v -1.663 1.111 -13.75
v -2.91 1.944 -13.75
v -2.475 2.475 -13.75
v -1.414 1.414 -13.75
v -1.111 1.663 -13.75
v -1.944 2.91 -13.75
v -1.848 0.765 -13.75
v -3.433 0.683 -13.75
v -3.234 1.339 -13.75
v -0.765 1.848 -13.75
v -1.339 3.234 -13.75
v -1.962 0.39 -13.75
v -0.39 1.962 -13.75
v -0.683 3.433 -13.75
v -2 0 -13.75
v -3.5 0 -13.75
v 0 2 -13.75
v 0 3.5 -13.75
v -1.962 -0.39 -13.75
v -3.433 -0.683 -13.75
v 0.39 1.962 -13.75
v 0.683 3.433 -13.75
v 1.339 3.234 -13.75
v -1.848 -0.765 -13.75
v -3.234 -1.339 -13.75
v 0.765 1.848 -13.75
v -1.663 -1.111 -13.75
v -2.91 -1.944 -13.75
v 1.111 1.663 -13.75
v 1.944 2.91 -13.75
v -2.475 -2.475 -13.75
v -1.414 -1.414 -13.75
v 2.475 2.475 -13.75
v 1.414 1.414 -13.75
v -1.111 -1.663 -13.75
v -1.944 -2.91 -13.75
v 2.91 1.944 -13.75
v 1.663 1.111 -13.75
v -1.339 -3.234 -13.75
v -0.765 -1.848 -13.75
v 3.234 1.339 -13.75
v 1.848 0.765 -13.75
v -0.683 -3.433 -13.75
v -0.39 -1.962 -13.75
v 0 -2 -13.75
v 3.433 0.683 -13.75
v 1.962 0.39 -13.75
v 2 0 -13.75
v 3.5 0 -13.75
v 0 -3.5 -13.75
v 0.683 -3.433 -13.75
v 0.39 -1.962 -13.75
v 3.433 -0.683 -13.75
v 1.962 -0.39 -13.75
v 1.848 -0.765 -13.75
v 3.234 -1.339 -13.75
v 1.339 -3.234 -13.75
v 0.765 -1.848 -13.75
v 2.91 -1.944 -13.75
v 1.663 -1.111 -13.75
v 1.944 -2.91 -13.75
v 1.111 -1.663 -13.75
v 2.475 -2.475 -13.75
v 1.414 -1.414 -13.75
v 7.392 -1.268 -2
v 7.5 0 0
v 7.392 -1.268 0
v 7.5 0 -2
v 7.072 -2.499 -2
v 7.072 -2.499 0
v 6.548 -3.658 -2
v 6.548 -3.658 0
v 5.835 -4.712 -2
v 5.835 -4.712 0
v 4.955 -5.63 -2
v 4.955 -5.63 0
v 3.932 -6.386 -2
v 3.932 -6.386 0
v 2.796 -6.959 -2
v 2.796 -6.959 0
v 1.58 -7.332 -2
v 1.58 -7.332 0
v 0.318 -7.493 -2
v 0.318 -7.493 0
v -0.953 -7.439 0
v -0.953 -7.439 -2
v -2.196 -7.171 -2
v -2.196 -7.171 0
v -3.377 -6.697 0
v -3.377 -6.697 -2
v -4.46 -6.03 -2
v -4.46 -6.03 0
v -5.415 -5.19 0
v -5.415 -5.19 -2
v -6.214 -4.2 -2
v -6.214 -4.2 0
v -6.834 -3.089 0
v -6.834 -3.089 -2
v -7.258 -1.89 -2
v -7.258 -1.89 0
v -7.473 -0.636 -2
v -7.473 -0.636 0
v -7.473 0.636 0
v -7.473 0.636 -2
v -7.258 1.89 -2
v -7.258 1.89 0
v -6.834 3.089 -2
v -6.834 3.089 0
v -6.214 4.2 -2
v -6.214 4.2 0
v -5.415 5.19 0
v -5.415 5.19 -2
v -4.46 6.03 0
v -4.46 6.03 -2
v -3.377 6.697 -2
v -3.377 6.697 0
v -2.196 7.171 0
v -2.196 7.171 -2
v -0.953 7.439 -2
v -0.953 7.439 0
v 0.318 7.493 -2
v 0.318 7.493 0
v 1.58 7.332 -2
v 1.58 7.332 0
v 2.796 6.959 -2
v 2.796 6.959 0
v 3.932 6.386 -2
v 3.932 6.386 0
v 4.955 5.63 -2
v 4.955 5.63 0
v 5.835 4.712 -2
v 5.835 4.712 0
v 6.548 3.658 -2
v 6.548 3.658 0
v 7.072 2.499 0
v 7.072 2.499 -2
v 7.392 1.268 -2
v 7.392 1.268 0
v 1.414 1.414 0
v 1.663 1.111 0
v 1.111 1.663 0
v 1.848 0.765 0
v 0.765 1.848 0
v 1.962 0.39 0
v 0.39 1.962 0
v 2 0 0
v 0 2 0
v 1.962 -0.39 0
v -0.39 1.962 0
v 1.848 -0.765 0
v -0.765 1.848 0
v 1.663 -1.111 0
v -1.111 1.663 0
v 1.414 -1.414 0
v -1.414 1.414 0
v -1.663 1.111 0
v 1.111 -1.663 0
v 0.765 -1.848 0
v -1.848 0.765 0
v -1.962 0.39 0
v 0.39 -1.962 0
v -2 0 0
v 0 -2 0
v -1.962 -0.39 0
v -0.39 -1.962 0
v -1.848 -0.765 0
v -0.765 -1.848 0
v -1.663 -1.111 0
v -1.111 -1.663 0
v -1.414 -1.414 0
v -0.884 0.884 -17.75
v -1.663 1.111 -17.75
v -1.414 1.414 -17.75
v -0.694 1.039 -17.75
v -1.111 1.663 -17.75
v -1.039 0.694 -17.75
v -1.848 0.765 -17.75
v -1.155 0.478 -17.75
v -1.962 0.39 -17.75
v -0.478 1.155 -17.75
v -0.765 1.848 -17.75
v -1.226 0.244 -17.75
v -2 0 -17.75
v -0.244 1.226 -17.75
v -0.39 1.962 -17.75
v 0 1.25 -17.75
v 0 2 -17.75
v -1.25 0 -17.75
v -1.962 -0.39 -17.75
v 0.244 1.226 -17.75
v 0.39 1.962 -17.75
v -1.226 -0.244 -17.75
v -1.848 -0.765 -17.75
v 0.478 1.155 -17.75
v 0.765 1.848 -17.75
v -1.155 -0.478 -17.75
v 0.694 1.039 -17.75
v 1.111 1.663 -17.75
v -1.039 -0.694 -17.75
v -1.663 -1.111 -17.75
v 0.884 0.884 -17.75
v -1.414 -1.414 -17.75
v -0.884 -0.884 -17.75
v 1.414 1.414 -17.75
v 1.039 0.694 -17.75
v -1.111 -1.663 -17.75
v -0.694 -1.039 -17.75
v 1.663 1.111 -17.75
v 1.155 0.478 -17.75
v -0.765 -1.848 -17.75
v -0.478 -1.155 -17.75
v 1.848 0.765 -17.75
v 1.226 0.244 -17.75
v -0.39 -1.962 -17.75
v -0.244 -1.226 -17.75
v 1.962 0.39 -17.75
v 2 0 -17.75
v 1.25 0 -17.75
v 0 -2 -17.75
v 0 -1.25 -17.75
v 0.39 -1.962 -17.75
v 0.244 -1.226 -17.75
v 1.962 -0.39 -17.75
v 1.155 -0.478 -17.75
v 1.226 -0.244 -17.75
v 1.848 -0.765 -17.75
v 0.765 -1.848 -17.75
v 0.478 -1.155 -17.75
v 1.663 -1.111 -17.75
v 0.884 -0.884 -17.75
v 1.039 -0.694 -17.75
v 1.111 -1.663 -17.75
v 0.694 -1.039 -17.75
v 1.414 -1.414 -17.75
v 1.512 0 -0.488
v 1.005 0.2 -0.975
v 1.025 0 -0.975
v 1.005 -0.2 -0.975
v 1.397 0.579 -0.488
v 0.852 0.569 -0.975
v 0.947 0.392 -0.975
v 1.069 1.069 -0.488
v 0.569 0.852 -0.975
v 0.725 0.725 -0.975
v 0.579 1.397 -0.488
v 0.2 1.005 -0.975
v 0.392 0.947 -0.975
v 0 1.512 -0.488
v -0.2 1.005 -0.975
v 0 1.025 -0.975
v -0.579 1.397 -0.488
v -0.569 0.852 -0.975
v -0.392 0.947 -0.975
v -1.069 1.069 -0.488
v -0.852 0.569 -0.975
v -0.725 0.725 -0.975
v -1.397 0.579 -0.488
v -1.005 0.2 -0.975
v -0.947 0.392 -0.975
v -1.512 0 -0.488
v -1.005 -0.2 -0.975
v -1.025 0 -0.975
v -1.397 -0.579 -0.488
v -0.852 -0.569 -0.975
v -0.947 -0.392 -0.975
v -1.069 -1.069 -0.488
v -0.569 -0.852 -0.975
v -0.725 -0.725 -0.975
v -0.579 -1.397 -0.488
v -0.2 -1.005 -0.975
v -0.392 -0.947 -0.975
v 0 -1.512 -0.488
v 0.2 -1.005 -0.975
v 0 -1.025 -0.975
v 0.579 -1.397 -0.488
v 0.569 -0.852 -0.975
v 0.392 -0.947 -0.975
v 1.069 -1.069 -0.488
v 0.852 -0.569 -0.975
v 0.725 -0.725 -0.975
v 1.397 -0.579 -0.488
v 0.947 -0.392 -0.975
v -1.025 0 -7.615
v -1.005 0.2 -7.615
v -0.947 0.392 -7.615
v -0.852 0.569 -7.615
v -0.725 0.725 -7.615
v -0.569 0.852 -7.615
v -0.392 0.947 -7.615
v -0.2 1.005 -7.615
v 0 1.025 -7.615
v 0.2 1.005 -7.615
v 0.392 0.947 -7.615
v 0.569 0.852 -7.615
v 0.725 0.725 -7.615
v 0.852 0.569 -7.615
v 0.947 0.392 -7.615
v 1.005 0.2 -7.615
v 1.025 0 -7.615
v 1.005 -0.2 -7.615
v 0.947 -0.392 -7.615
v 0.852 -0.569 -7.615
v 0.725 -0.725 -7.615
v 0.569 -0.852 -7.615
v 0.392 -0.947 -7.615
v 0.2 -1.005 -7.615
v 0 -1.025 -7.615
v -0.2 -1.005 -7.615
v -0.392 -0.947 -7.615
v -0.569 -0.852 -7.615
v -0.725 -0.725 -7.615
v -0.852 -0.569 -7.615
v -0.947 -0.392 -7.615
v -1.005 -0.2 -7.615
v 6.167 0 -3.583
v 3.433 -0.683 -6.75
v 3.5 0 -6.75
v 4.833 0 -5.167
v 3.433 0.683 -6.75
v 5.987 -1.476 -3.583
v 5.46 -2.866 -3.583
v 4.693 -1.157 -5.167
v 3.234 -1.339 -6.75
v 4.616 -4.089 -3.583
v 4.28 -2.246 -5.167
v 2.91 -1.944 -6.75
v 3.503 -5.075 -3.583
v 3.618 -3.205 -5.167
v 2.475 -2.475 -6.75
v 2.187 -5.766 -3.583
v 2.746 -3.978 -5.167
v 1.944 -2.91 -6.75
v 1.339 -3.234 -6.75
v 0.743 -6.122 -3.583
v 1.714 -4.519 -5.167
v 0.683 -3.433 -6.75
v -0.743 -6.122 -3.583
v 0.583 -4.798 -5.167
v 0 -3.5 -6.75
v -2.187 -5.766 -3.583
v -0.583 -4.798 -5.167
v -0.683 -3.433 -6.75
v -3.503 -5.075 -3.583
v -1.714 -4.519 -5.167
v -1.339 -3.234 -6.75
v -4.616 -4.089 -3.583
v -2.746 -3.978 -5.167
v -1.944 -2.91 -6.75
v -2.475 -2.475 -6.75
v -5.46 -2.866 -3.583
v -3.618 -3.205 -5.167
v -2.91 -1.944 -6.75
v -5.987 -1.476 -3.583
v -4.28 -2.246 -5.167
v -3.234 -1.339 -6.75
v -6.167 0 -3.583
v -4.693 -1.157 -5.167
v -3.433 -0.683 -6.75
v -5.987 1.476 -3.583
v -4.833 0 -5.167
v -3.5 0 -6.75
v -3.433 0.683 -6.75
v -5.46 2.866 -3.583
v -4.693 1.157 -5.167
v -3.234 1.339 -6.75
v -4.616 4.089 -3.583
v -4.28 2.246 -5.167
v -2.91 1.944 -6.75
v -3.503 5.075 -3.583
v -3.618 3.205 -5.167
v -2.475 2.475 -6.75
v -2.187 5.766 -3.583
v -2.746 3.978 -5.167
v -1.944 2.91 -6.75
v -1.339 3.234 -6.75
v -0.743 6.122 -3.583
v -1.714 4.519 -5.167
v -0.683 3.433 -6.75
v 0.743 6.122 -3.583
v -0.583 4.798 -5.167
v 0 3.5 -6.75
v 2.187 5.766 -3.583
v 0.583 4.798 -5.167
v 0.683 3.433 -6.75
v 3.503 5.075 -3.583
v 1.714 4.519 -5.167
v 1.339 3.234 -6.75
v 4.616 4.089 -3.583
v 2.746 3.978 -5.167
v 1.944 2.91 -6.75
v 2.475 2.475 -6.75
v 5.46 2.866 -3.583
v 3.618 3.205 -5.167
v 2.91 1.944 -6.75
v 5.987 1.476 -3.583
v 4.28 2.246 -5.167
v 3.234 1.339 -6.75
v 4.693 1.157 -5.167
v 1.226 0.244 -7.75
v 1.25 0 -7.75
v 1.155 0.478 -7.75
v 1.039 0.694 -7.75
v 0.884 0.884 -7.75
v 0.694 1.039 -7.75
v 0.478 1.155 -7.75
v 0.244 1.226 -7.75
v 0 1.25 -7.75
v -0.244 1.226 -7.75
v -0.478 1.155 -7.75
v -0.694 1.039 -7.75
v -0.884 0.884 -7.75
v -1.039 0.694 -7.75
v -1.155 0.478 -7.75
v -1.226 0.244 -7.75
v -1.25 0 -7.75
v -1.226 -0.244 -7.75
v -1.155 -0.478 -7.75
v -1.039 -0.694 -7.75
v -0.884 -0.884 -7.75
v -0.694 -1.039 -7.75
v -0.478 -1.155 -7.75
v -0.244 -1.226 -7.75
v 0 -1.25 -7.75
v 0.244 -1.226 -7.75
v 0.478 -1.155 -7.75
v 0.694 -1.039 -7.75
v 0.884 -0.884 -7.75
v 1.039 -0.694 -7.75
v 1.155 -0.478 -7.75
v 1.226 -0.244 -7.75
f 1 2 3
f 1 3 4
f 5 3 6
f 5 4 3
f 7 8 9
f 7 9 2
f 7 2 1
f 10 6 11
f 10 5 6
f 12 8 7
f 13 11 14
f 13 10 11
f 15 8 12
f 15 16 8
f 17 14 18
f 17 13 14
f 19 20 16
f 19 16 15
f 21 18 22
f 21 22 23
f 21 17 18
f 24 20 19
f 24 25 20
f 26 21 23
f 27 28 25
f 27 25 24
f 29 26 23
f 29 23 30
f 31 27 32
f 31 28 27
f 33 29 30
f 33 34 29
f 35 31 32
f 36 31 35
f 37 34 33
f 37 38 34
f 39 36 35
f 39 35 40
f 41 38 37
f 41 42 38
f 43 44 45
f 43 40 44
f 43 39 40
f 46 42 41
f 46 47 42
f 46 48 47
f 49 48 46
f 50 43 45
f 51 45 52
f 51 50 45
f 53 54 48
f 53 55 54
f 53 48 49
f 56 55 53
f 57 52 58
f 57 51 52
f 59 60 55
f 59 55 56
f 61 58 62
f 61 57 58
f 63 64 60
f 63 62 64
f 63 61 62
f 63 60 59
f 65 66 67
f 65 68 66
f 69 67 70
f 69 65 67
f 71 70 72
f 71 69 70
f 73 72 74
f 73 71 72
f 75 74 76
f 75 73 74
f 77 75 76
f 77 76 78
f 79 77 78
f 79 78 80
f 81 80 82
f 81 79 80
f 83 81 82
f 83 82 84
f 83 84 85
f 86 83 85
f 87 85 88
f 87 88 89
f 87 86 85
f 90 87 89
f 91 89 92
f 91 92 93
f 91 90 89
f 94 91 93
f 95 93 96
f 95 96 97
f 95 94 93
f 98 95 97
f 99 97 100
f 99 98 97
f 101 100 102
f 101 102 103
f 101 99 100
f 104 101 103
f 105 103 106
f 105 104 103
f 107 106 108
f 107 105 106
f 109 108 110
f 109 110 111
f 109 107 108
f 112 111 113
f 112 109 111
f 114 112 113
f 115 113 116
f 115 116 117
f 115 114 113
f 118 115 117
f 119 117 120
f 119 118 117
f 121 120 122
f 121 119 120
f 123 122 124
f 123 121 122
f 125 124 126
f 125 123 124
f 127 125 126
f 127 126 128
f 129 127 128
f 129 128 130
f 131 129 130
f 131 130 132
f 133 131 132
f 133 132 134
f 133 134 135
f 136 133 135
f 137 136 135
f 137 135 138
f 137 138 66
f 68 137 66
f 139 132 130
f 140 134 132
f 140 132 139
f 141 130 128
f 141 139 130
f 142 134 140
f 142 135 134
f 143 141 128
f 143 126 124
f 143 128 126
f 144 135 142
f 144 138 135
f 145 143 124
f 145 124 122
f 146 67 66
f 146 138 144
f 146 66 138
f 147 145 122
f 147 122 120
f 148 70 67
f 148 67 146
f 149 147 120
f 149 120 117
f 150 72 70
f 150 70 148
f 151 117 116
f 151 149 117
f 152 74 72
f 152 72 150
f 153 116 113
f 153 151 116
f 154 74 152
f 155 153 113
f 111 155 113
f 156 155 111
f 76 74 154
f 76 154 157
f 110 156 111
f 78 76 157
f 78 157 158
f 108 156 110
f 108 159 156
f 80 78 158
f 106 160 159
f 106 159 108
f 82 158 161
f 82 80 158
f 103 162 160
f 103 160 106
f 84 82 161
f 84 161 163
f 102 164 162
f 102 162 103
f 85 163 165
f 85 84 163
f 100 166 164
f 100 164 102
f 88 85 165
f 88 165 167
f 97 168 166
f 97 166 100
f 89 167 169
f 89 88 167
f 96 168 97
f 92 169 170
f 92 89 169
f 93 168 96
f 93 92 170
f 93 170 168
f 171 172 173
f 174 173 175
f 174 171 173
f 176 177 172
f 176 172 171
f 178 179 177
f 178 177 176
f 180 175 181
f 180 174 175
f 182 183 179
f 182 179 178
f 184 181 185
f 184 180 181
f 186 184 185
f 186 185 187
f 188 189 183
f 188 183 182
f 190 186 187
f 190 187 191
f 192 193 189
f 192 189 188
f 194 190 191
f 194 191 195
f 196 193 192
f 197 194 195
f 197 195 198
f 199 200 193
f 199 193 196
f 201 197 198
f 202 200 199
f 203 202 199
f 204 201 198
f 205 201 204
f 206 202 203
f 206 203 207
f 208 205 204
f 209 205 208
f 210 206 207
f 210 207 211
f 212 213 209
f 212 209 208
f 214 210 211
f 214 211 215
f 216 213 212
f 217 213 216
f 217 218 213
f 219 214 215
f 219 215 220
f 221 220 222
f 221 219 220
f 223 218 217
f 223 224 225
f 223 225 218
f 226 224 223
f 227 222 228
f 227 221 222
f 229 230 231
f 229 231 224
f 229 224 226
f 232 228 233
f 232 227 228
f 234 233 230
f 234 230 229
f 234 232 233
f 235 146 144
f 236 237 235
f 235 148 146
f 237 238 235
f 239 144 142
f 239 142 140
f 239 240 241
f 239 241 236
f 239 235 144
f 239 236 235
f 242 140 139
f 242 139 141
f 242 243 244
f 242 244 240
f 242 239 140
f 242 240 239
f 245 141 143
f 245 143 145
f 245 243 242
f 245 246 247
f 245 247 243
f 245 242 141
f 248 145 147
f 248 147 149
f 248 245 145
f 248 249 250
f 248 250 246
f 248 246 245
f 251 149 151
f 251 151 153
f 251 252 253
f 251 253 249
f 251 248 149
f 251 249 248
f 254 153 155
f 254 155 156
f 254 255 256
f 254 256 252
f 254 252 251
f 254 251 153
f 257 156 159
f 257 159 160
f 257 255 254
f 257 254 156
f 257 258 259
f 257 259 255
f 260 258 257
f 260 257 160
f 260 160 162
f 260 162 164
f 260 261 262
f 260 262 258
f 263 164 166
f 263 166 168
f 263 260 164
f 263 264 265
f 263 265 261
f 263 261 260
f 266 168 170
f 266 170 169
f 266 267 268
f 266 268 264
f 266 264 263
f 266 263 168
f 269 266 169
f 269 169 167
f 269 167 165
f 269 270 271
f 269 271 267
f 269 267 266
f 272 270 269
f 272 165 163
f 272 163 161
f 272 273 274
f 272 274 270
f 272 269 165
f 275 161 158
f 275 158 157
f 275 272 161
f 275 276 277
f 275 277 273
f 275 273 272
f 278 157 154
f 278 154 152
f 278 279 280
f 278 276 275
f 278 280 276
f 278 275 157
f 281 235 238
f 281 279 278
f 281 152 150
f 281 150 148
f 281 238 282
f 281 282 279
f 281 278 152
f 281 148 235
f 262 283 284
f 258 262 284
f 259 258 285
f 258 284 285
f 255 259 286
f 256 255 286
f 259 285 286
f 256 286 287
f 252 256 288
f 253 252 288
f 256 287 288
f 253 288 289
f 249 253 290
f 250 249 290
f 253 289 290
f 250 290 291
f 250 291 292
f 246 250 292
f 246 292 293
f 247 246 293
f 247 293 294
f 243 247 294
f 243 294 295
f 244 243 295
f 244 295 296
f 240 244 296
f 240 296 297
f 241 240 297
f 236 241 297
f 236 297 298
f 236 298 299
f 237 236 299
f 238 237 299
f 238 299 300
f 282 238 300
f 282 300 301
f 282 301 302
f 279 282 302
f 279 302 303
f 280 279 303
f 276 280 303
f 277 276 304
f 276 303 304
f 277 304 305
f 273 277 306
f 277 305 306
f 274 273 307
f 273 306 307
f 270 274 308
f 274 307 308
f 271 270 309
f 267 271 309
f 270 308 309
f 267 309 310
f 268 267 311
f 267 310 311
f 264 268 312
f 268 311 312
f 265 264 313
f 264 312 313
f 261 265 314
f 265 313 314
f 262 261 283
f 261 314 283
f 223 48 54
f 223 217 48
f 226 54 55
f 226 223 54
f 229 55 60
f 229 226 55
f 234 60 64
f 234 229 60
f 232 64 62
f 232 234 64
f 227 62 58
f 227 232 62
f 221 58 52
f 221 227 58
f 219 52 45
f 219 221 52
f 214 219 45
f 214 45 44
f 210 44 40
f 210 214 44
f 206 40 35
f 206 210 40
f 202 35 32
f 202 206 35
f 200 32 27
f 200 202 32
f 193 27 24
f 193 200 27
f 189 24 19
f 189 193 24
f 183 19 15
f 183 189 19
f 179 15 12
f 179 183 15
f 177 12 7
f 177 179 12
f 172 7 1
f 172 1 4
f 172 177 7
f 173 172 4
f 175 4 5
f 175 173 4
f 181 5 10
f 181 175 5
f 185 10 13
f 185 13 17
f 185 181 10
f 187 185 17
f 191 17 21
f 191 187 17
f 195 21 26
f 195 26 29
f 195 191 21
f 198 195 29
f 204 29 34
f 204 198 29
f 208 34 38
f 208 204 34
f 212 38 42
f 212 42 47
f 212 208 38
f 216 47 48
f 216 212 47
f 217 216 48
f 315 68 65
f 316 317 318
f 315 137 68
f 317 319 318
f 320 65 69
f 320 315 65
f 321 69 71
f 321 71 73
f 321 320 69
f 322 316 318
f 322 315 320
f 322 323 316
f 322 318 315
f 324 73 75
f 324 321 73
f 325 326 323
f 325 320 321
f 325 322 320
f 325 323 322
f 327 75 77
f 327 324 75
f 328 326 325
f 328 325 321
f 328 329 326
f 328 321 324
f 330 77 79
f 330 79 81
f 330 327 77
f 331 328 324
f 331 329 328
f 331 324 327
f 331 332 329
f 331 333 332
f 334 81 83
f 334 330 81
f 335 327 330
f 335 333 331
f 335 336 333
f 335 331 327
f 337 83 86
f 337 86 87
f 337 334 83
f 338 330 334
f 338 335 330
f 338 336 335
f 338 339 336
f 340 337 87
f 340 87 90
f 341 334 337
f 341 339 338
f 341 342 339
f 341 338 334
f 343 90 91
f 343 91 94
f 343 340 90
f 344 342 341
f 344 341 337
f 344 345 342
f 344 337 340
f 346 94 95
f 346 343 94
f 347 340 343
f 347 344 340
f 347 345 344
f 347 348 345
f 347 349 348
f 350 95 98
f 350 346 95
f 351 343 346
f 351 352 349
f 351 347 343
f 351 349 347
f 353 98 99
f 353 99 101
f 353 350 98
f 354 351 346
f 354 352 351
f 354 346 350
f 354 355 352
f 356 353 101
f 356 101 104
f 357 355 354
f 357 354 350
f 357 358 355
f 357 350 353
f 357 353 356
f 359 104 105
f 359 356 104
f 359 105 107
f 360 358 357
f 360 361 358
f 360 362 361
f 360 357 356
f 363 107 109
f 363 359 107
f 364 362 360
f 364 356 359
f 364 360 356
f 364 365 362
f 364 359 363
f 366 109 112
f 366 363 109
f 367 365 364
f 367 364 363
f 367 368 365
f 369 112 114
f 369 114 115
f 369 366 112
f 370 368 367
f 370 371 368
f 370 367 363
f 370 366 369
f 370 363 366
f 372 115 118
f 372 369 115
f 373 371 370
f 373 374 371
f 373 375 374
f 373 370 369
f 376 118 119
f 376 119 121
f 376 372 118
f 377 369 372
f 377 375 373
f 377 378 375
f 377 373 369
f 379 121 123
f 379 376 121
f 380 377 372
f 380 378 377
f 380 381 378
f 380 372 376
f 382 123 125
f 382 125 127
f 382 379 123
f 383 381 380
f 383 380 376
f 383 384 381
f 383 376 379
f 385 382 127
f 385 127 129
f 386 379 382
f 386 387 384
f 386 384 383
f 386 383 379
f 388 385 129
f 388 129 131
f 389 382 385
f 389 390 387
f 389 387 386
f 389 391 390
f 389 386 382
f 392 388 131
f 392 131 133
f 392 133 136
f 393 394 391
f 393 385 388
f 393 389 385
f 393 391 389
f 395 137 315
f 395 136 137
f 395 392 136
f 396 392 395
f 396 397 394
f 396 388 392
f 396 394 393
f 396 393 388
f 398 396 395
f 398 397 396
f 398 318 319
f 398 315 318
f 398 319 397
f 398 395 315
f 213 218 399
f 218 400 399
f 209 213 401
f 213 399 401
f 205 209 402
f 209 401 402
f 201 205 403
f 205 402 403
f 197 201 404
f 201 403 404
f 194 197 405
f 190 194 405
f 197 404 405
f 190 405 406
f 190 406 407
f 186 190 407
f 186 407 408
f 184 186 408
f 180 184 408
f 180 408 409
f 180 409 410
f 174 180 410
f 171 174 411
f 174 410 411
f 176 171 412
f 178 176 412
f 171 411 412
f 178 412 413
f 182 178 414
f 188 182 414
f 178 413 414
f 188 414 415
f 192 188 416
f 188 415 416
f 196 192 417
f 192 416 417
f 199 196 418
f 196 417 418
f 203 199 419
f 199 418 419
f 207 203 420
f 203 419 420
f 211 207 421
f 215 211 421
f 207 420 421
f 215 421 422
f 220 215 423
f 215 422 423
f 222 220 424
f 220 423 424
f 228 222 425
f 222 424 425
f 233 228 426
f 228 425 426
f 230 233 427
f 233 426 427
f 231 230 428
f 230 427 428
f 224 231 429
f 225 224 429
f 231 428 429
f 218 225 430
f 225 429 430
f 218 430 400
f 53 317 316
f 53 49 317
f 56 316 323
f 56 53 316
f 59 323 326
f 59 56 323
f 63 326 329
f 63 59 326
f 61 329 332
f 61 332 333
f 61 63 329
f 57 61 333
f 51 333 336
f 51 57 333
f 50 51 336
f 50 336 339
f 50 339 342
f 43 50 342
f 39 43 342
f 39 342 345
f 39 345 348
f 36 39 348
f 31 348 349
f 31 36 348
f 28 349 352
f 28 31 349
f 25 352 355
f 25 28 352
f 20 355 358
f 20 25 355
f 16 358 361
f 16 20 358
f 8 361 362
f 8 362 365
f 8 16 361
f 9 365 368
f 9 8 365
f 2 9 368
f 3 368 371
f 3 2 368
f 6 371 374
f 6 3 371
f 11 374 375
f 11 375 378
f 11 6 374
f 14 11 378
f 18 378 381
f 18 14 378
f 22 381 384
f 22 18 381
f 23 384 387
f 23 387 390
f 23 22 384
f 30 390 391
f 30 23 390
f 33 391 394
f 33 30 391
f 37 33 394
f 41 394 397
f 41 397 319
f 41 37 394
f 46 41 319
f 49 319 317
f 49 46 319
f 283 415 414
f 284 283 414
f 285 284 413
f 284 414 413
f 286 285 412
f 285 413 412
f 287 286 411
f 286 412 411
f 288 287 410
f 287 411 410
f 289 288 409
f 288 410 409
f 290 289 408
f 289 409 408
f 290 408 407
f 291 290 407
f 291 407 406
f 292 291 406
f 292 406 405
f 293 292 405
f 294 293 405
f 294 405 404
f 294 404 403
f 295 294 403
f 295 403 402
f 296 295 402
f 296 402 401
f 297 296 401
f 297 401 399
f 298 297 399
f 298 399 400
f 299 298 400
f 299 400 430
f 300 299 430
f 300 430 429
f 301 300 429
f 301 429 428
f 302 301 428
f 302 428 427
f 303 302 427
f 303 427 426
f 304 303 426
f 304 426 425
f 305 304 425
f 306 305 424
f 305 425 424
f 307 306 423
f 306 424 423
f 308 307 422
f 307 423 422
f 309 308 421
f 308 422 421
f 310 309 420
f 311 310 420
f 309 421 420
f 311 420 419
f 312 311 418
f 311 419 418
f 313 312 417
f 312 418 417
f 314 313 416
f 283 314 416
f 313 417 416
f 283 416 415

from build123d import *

# Parameters (mm, degrees)
BROCA_DE_ROSQUEAR_PARA_TARRAXA_DE_M2_5X0_D = 2.05
FURO_ROSCADO_DE_M3X0_53_D                  = 2.5
FURO_ROSCADO_DE_M3X0_53_DEPTH              = 10
FURO_ROSCADO_DE_M3X0_53_TIP                = 0.751075774


with BuildPart() as part:
    # Esboço1 → Revolução1 (revolve)
    with BuildSketch(Plane(origin=(0, 0, 0), x_dir=(1, 0, 0), z_dir=(0, 1, 0))):
        Polygon((0, 0), (7.5, 0), (7.5, 2), (3.5, 6.75), (3.5, 13.75), (2, 13.75), (2, 17.75), (0, 17.75), align=None)
    revolve(axis=Axis((0, 0, 0), (0, 0, -1)))

    # Esboço8 → Corte-Revolução3 (revolve, cut)
    with BuildSketch(Plane(origin=(0, 0, 0), x_dir=(1, 0, 0), z_dir=(0, 1, 0))):
        Polygon((0, 0), (2, 0), (0, 2), align=None)
    revolve(axis=Axis((0, 0, -3.199109989), (0, 0, 1)), mode=Mode.SUBTRACT)

    # Broca de rosquear para tarraxa de M2.5x0.451 (through all)
    with Locations(Plane.XY):
        with Locations((0, 0)):
            Hole(BROCA_DE_ROSQUEAR_PARA_TARRAXA_DE_M2_5X0_D / 2)

    # Furo roscado de M3x0.53
    with Locations(Plane(origin=(0, 0, -17.75), x_dir=(-1, 0, 0), z_dir=(0, 0, -1))):
        with Locations((0, 0)):
            Hole(FURO_ROSCADO_DE_M3X0_53_D / 2, depth=FURO_ROSCADO_DE_M3X0_53_DEPTH)
            with Locations((0, 0, -(FURO_ROSCADO_DE_M3X0_53_DEPTH + FURO_ROSCADO_DE_M3X0_53_TIP / 2))):  # 118° drill point
                Cone(0, FURO_ROSCADO_DE_M3X0_53_D / 2, FURO_ROSCADO_DE_M3X0_53_TIP, mode=Mode.SUBTRACT)


solid = part.part
